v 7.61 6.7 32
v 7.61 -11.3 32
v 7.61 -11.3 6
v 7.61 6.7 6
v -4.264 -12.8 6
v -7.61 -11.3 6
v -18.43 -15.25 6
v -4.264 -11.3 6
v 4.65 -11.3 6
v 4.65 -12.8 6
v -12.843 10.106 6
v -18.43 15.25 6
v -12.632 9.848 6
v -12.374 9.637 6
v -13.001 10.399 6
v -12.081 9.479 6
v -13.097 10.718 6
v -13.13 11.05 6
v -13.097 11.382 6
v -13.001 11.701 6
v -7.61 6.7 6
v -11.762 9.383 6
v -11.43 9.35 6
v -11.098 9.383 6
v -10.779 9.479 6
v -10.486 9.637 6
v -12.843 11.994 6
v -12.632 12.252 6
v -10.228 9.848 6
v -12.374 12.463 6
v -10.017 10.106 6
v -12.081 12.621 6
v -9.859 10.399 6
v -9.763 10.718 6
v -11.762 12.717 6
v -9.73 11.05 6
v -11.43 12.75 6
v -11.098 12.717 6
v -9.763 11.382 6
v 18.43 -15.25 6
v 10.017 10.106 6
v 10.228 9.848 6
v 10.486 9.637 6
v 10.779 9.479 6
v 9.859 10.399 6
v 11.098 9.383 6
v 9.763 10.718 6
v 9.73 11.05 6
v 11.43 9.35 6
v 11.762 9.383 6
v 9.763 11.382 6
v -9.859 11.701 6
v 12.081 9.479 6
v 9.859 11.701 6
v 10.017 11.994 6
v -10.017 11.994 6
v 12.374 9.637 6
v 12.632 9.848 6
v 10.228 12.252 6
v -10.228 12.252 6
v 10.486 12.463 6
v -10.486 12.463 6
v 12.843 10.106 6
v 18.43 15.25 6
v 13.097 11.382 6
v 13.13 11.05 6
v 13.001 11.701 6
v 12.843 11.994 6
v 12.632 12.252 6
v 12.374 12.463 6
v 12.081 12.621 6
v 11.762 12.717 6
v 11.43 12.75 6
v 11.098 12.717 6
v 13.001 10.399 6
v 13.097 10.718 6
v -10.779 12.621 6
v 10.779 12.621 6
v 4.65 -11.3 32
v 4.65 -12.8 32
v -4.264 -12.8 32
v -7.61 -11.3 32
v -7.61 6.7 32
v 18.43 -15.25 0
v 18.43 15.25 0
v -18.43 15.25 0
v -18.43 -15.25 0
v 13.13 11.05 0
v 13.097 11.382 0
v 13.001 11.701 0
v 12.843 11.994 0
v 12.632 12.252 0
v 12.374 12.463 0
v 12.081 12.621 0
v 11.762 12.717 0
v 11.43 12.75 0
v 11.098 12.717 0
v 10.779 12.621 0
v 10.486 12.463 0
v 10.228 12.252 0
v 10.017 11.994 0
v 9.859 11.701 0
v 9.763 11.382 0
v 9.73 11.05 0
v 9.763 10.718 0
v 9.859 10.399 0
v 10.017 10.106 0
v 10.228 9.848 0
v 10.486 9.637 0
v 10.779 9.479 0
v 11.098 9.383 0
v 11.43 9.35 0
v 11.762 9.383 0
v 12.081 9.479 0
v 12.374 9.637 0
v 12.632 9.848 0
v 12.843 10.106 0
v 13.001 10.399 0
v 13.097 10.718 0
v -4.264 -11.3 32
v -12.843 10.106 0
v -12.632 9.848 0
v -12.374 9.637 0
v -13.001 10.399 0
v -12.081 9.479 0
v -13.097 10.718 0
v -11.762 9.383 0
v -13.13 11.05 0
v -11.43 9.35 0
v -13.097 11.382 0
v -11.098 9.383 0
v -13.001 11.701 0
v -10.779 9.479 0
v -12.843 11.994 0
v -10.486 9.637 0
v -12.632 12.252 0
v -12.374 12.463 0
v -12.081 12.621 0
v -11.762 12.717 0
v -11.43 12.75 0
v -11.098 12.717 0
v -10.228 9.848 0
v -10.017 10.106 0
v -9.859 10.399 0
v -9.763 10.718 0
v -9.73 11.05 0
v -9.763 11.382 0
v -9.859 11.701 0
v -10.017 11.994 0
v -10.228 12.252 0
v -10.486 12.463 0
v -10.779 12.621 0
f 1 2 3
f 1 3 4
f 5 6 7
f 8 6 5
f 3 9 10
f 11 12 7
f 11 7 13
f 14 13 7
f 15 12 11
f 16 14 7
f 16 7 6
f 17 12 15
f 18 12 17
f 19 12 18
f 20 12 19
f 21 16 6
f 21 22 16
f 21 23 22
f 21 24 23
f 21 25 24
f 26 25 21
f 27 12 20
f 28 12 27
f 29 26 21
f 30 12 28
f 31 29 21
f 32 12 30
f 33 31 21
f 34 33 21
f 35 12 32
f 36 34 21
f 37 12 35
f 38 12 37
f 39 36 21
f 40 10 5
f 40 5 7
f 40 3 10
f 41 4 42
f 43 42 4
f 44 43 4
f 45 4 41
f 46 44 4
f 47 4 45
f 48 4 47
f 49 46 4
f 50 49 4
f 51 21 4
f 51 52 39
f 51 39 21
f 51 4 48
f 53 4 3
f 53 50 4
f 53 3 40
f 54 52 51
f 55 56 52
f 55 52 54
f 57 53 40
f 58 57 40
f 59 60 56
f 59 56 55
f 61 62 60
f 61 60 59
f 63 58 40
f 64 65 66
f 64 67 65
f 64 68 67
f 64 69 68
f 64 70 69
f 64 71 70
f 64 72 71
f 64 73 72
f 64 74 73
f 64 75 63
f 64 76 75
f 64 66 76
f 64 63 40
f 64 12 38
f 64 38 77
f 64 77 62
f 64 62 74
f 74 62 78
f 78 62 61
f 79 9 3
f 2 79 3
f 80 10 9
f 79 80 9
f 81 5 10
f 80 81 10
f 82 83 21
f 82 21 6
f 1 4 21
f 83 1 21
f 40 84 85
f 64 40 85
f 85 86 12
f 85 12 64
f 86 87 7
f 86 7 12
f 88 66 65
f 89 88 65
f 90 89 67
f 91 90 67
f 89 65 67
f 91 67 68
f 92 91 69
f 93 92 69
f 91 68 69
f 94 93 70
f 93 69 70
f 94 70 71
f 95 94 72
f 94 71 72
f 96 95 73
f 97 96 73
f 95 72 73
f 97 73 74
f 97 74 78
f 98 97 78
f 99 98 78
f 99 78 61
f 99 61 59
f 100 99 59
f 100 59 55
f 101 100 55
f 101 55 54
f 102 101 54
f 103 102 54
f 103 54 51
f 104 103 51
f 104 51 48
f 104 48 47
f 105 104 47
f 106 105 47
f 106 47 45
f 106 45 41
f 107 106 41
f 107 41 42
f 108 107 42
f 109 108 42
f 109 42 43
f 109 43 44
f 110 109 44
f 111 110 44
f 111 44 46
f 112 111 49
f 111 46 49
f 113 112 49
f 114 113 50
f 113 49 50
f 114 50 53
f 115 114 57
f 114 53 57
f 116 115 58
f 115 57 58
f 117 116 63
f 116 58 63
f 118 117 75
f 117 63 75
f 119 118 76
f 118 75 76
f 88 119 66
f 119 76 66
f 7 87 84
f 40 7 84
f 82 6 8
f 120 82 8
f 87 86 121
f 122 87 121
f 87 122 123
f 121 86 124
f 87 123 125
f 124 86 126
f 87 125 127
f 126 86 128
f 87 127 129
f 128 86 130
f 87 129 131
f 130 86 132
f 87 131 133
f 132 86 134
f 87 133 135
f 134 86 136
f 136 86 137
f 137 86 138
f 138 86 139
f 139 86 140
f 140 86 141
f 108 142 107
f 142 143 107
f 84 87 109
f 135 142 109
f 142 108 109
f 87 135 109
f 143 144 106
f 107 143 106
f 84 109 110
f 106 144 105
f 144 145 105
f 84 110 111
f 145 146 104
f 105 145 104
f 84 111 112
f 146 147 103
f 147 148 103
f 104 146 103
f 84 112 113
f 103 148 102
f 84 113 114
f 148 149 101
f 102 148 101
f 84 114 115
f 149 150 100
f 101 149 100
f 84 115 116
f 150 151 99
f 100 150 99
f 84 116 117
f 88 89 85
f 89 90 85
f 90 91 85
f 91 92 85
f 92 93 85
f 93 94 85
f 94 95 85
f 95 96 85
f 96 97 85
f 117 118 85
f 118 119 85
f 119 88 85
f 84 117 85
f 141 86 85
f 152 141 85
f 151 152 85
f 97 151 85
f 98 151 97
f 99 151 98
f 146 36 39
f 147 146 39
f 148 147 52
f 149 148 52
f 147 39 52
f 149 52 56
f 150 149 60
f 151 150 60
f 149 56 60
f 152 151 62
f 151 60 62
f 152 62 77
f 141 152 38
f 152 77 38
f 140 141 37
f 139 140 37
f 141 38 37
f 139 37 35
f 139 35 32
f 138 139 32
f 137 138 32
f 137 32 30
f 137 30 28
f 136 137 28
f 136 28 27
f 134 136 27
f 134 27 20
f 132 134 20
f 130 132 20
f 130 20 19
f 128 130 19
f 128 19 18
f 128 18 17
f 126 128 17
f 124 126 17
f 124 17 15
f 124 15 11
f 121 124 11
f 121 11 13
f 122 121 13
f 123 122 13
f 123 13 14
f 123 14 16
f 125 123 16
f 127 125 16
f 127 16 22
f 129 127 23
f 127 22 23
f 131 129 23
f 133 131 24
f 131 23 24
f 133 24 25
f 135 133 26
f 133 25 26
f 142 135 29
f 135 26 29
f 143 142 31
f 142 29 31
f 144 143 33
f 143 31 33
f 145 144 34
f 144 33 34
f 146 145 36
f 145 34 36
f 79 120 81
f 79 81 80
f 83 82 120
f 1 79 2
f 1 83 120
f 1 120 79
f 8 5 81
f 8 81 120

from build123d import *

# Parameters (mm, degrees)
F0_W     = 36.86
F0_H     = 30.5
F1_DEPTH = 6
F2_R     = 1.7
F3_DEPTH = 25
F4_W     = 8.913981
F4_H     = 1.5
F5_DEPTH = 26


with BuildPart() as f1:
    # F0 (on Top) → F1 (new body)
    with BuildSketch(Plane.XY):
        Rectangle(F0_W, F0_H)
    extrude(amount=F1_DEPTH)

    # F2 (on face) → F3 (cut)
    with BuildSketch(Plane.XY.offset(6)):
        with Locations((-11.43, 11.05)):
            Circle(F2_R)
        with Locations((11.43, 11.05)):
            Circle(F2_R)
    extrude(amount=-F3_DEPTH, mode=Mode.SUBTRACT)

    # F4 (on face) → F5 (join)
    with BuildSketch(Plane.XY.offset(6)):
        Polygon((-7.61, 6.7), (-7.61, -11.3), (-4.264409, -11.3), (4.649572, -11.3), (7.61, -11.3), (7.61, 6.7), align=None)
        with Locations((0.192582, -12.05)):
            Rectangle(F4_W, F4_H)
    extrude(amount=F5_DEPTH)


solid = f1.part
